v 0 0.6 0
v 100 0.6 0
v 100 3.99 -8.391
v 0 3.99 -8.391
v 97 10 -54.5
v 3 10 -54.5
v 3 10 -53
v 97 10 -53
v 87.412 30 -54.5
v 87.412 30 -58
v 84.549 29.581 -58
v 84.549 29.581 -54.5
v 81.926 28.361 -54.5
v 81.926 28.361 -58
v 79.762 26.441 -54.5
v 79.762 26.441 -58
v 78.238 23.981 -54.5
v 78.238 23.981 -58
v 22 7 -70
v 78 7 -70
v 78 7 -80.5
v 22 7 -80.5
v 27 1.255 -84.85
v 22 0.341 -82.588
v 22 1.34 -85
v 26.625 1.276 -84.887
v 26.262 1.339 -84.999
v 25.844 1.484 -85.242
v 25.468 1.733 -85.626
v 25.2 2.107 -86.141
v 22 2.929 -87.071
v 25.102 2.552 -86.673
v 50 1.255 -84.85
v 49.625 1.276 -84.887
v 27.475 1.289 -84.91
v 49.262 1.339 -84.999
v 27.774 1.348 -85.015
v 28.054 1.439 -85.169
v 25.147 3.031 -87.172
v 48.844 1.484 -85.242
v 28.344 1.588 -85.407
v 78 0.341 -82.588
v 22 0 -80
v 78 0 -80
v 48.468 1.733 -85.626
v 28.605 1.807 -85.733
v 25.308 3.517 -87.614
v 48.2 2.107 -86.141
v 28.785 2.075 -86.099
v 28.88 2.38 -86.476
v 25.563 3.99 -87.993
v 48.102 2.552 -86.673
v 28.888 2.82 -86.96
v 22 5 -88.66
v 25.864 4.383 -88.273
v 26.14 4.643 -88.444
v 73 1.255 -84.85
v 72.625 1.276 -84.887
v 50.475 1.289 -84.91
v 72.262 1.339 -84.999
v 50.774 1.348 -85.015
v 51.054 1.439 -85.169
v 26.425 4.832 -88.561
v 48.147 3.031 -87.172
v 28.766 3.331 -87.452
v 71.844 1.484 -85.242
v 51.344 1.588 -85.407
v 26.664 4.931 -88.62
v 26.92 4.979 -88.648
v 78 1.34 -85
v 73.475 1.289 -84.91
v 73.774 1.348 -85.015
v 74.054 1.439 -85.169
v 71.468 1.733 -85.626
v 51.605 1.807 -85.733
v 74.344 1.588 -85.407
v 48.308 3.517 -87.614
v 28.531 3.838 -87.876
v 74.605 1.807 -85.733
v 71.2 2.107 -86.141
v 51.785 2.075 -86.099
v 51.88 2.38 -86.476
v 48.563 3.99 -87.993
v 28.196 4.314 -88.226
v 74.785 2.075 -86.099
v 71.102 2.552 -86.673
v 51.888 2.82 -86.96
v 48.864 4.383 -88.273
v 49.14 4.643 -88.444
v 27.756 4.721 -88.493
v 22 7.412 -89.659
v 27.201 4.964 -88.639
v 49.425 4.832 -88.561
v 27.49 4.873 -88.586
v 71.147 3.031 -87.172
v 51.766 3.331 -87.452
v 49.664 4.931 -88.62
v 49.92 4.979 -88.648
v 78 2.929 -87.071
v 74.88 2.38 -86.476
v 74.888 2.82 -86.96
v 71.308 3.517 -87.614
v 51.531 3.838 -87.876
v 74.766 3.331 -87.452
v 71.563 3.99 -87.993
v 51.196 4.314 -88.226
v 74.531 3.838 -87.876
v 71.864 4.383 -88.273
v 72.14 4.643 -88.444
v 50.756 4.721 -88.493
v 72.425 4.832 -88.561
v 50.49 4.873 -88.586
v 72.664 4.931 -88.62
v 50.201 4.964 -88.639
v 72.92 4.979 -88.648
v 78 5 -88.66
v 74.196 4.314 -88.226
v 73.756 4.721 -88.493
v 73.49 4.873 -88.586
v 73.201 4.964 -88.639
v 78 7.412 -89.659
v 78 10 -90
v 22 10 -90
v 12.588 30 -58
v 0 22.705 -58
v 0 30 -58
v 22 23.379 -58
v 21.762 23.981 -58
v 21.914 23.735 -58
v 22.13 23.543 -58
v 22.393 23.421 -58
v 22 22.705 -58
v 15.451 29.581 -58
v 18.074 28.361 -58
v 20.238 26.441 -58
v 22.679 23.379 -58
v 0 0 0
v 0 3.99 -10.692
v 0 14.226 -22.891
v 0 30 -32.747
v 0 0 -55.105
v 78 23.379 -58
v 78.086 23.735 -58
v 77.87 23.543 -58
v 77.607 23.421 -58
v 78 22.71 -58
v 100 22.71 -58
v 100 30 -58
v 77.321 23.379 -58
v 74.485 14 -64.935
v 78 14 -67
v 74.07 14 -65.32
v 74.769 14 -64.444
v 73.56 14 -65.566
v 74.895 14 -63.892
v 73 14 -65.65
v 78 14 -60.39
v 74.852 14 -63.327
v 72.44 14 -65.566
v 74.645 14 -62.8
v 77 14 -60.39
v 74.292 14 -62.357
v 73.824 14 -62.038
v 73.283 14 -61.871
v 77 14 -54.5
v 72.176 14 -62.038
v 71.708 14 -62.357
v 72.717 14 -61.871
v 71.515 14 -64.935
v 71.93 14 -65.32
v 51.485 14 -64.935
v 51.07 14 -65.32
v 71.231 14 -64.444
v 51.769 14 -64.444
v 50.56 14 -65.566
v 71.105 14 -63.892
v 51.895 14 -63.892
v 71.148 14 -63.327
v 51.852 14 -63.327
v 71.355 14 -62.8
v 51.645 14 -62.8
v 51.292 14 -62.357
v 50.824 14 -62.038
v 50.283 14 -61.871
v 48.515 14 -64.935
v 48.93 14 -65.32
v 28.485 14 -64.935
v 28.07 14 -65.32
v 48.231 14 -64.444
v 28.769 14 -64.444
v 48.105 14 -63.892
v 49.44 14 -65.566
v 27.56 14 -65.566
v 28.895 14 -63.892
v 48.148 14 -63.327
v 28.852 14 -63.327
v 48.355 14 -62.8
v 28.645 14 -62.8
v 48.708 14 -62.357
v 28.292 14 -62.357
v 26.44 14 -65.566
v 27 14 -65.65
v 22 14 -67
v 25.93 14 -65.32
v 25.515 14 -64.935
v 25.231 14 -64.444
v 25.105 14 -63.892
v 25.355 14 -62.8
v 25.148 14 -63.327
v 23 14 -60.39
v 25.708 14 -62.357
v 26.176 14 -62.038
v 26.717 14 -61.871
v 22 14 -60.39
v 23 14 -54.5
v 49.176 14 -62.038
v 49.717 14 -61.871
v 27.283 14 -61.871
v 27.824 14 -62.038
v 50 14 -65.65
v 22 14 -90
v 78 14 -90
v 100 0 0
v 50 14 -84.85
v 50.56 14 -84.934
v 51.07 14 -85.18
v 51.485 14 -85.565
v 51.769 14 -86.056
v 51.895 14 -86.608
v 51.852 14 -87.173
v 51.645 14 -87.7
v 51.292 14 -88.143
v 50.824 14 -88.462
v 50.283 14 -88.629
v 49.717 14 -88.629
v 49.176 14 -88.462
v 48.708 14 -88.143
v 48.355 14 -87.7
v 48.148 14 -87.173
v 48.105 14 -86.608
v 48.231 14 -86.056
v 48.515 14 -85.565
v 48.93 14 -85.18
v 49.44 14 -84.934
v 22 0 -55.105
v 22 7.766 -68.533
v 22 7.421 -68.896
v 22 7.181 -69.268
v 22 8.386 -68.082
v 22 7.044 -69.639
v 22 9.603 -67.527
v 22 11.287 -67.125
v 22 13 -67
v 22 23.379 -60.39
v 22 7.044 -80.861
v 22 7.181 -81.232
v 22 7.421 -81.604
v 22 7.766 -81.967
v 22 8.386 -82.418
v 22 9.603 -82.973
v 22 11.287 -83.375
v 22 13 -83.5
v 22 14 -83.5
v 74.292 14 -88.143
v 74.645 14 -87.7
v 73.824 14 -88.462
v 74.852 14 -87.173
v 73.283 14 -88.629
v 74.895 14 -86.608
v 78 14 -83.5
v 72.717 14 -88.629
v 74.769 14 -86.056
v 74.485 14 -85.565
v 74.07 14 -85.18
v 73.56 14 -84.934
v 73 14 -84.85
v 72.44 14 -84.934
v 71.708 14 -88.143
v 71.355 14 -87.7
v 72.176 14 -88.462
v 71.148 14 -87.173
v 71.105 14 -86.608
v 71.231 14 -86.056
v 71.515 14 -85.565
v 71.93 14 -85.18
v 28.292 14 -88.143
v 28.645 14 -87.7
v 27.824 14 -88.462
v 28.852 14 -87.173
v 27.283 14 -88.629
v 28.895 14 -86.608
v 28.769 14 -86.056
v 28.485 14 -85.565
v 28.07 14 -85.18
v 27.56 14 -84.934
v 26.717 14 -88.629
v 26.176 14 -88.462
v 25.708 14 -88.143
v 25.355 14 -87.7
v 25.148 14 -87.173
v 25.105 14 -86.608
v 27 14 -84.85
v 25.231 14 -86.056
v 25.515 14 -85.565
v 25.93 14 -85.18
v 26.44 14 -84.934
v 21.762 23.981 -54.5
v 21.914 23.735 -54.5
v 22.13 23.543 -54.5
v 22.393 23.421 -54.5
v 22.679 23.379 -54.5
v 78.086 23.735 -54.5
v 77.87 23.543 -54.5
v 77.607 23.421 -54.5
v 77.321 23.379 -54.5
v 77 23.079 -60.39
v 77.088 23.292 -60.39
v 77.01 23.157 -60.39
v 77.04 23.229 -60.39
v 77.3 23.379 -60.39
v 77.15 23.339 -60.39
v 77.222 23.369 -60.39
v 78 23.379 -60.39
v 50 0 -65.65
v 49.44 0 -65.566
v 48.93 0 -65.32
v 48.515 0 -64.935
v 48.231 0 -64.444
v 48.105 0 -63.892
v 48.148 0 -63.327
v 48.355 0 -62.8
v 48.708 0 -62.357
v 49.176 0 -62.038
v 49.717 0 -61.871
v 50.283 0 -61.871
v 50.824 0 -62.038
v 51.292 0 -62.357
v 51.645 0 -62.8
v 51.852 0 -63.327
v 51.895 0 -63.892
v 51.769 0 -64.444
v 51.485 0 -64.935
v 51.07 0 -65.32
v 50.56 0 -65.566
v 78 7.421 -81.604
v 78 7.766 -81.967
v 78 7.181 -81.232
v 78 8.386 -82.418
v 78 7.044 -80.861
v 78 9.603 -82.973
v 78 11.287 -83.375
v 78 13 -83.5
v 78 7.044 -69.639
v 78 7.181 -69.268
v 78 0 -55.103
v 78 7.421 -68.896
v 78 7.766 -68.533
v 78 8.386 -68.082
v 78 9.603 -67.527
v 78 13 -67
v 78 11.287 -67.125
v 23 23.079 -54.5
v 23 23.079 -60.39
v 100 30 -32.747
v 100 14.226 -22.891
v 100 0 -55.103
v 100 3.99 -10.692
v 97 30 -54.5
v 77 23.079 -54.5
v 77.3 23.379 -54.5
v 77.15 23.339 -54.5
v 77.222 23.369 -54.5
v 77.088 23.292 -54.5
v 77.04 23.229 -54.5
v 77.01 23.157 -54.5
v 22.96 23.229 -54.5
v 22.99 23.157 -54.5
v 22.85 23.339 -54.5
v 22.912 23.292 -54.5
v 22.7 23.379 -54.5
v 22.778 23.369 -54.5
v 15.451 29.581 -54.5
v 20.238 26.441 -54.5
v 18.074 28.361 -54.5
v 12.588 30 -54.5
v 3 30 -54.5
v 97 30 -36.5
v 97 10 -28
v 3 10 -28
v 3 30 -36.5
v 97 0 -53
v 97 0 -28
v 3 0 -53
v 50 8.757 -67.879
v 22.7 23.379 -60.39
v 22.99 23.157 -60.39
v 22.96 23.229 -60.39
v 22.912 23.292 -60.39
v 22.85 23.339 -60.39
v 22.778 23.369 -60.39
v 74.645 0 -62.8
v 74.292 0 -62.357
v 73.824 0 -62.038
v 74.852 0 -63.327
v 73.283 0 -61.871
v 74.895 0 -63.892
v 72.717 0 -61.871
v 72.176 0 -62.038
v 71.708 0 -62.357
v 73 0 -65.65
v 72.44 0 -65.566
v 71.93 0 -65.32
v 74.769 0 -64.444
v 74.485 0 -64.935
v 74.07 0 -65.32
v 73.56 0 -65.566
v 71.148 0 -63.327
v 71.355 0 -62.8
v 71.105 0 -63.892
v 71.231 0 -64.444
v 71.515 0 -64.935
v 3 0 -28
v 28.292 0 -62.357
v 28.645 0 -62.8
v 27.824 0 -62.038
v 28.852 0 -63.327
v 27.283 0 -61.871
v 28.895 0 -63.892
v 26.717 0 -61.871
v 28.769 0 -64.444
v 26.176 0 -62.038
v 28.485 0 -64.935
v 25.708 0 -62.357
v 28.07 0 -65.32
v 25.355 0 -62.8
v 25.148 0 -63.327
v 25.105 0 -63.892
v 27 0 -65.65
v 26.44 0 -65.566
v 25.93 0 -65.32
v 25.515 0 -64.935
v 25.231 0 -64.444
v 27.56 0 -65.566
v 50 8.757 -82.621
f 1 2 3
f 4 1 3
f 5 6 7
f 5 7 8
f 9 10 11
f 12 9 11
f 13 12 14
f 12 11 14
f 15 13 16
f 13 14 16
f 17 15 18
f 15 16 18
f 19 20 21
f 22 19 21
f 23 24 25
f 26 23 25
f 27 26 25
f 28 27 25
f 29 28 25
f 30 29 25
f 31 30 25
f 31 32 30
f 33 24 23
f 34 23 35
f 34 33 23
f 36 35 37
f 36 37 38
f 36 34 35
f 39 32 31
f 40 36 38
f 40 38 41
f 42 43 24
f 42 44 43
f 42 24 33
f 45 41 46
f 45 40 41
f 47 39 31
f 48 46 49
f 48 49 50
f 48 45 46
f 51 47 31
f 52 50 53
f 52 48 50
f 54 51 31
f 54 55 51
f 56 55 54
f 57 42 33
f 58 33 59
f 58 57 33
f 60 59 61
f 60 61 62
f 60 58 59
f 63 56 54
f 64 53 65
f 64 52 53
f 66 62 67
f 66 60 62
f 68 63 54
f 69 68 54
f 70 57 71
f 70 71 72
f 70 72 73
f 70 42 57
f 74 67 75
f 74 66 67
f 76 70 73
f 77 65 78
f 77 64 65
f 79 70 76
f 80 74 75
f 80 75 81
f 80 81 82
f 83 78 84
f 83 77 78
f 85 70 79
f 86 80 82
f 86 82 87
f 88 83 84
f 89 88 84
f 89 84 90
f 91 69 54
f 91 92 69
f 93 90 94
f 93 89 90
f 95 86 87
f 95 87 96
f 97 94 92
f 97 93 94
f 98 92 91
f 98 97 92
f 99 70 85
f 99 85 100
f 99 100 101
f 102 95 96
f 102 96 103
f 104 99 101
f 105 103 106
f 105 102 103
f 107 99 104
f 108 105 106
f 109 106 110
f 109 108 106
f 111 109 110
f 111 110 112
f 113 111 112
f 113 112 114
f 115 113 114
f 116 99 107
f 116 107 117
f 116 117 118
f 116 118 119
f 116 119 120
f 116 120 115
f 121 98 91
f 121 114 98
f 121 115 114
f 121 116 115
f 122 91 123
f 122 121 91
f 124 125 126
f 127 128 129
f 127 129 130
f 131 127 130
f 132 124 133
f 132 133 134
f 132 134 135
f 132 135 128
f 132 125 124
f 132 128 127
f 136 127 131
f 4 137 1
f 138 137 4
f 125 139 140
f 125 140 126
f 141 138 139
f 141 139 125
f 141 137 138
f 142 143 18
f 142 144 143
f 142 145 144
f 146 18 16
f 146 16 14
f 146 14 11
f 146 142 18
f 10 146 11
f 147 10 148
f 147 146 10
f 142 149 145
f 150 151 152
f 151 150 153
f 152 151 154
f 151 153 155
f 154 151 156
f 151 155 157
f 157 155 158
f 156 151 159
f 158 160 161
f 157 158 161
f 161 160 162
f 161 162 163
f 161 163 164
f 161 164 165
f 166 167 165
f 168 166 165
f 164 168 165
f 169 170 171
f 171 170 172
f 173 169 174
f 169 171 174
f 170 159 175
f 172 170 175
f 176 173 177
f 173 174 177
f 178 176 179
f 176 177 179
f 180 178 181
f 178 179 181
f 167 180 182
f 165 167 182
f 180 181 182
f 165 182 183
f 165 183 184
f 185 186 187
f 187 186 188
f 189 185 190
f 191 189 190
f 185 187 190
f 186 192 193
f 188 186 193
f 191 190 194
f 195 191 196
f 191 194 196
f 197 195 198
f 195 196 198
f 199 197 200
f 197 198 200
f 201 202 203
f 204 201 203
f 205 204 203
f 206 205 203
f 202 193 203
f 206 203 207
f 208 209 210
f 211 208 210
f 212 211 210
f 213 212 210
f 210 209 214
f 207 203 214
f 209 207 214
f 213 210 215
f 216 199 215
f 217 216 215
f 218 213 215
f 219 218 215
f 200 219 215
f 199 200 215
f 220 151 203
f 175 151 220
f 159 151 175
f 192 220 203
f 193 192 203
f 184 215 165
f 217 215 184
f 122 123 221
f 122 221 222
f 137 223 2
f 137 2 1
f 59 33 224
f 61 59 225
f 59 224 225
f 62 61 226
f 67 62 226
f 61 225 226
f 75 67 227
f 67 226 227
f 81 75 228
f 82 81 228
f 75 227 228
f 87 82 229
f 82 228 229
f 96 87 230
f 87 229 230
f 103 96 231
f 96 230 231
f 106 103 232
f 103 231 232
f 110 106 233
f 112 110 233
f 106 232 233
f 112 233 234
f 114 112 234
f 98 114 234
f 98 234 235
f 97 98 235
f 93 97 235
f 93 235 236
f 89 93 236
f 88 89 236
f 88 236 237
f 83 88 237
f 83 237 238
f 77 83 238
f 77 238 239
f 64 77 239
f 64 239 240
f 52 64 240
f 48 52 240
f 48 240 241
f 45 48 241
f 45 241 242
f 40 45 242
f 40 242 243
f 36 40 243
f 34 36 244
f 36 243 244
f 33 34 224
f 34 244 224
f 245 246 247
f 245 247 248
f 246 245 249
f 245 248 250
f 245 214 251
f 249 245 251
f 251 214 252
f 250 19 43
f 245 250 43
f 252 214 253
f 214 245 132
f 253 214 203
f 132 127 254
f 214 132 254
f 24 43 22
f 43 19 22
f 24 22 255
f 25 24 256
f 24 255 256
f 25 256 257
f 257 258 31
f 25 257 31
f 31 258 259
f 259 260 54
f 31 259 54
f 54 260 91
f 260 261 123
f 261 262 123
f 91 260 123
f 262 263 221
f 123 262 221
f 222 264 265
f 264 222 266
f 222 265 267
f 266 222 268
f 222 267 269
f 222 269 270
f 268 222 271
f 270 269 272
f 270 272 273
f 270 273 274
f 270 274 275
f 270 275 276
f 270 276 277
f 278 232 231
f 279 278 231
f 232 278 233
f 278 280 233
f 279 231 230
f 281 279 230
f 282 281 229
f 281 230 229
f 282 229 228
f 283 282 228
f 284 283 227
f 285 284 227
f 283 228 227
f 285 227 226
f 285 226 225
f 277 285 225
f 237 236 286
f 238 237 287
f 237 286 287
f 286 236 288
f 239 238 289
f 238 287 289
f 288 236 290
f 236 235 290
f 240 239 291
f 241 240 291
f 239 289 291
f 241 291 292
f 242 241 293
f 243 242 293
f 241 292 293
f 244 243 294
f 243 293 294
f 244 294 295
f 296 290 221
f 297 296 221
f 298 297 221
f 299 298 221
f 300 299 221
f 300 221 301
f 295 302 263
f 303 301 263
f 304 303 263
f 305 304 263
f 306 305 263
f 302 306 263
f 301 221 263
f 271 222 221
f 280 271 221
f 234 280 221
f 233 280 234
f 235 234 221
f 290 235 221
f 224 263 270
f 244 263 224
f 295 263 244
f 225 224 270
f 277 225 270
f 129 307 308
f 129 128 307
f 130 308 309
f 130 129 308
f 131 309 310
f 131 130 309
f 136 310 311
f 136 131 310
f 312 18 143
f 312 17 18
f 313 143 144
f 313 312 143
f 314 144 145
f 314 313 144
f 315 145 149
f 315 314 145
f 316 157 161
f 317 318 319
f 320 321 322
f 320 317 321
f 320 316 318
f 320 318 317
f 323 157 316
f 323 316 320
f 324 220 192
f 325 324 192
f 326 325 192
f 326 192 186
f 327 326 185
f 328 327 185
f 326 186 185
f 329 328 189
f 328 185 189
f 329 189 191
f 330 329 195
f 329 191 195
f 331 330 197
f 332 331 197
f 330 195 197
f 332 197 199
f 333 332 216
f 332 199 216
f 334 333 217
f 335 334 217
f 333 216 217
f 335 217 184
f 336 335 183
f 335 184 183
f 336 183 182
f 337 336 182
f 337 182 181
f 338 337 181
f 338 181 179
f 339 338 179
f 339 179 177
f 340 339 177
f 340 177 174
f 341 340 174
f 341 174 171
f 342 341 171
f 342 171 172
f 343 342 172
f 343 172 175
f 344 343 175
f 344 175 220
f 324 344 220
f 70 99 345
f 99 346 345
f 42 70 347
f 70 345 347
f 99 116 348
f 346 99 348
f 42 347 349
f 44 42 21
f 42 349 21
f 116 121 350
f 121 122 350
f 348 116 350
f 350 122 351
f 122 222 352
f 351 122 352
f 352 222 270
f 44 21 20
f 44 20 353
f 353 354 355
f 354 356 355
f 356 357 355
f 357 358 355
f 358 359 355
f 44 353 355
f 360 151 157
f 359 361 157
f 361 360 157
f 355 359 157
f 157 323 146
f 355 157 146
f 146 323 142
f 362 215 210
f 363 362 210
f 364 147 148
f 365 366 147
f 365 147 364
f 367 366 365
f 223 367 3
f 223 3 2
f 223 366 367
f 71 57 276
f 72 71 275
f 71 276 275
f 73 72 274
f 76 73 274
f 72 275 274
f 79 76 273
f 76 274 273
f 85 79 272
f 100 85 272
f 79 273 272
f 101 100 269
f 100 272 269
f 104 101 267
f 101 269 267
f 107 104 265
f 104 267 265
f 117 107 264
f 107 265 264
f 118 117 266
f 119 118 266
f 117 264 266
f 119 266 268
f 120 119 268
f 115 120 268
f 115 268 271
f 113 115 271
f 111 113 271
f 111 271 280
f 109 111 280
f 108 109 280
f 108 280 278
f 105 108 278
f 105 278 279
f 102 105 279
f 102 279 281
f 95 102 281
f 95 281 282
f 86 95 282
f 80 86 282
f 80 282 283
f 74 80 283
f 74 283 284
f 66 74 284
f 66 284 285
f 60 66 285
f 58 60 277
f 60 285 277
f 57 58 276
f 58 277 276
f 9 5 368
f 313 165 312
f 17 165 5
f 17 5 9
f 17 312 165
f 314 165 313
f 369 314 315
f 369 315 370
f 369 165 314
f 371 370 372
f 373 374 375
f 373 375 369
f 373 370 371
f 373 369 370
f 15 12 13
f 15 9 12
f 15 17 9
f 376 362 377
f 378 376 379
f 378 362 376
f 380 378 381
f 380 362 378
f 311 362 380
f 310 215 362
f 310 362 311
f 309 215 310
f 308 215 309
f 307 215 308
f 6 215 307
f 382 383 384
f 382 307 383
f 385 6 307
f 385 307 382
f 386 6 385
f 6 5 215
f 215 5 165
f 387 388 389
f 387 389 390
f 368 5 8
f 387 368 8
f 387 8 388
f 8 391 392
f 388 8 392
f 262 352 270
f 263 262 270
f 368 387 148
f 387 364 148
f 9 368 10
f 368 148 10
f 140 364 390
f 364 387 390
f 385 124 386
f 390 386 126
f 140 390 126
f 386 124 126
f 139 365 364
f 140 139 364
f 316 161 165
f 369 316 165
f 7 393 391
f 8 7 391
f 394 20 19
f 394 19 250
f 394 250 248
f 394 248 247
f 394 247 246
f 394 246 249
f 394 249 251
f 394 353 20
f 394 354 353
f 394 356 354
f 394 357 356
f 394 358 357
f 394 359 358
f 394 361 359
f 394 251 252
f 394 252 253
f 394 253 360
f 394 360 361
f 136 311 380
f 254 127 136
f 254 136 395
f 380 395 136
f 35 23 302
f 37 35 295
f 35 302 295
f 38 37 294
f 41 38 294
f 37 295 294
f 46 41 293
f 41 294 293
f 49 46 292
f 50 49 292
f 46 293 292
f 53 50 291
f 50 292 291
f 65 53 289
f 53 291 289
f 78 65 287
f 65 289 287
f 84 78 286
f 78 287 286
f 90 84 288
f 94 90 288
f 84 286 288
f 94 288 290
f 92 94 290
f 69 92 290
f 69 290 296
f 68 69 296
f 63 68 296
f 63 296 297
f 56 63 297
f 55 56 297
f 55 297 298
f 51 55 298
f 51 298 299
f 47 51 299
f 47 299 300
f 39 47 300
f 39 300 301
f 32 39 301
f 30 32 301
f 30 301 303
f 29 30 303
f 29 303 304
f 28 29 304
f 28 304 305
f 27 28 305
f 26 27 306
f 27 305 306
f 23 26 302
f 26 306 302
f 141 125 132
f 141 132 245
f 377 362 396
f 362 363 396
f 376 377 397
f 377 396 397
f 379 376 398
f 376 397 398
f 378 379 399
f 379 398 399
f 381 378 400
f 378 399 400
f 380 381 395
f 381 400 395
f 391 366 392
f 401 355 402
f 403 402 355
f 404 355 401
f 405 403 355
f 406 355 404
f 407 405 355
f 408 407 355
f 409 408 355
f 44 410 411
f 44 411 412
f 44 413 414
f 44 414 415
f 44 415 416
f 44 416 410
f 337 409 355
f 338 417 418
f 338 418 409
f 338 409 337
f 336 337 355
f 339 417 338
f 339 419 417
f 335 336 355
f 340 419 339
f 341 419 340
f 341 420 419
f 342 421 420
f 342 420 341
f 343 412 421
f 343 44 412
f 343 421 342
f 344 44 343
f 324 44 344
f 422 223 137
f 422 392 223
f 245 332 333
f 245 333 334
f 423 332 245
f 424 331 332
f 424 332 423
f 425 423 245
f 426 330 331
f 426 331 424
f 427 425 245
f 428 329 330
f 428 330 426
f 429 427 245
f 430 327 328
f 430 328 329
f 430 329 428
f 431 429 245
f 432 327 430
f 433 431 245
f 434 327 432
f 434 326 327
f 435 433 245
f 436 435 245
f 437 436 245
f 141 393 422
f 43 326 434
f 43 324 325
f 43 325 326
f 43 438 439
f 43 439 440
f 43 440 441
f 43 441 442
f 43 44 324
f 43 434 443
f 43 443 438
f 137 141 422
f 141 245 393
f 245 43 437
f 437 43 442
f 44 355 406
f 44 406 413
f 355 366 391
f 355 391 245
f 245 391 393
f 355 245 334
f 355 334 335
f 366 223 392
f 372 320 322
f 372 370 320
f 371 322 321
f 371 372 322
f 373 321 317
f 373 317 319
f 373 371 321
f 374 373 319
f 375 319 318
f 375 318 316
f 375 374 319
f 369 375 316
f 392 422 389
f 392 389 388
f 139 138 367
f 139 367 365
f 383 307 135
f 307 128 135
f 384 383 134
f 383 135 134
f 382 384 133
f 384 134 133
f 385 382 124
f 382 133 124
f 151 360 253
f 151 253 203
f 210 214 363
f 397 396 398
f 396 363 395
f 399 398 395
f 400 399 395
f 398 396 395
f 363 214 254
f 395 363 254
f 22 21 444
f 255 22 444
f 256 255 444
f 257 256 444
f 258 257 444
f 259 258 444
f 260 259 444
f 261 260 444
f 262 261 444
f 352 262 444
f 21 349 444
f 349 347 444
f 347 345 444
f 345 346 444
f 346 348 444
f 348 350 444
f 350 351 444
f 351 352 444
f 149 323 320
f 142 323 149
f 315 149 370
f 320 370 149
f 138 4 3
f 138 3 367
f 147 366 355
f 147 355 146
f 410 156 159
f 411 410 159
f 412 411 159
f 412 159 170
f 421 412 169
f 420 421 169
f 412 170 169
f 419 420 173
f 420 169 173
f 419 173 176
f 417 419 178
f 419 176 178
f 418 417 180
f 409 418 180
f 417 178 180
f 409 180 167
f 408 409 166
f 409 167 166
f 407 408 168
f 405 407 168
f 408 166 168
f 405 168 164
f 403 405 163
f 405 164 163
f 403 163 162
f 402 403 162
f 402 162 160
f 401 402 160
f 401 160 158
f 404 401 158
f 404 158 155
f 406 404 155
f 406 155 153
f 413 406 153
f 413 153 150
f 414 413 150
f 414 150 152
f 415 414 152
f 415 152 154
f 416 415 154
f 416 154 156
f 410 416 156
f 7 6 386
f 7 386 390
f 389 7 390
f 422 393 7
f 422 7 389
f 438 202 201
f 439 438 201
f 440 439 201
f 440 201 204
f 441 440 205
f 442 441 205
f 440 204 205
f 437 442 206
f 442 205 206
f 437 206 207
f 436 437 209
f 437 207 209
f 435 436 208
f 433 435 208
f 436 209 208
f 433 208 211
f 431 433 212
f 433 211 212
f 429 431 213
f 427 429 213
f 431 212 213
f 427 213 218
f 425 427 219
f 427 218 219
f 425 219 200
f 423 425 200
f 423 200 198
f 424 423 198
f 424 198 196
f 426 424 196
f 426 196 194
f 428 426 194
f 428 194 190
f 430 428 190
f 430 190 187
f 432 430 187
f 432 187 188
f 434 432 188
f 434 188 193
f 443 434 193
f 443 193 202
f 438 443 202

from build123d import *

# Parameters (mm, degrees)
RESSALTO_EXTRUS_O1_DEPTH = 30
CORTE_EXTRUS_O1_DEPTH    = 100
ESBO_O4_W                = 94
ESBO_O4_H                = 25
CORTE_EXTRUS_O2_DEPTH    = 10
ESBO_O5_W                = 94
ESBO_O5_H                = 18
CORTE_EXTRUS_O3_DEPTH    = 20
CORTE_EXTRUS_O7_START    = -3
CORTE_EXTRUS_O7_DEPTH    = 94
ESBO_O8_W                = 32
ESBO_O8_H                = 15
CORTE_EXTRUS_O8_DEPTH    = 56
ESBO_O9_W                = 16.5
ESBO_O9_H                = 8
CORTE_EXTRUS_O9_DEPTH    = 56
FILETE1_SIZE             = 3
FILETE1_SIZE_2           = 6
FILETE2_SIZE             = 3
FILETE2_SIZE_2           = 6
FILETE3_R                = 10
ESBO_O12_W               = 32
ESBO_O12_H               = 1
CORTE_EXTRUS_O12_DEPTH   = 68
CORTE_EXTRUS_O13_REACH   = 121.432
ESBO_O14_W               = 56
ESBO_O14_H               = 16
CORTE_EXTRUS_O14_DEPTH   = 138.840487586
ESBO_O16_R               = 1.9
CORTE_EXTRUS_O15_DEPTH   = 136.484316502
ESBO_O19_W               = 5.89
ESBO_O19_H               = 9.379485794
RESSALTO_EXTRUS_O4_DEPTH = 1
ESBO_O20_W               = 5.89
ESBO_O20_H               = 9.379485794
RESSALTO_EXTRUS_O5_DEPTH = 1
FILETE5_R                = 10
FILETE6_R                = 0.3
FILETE7_R                = 1
CORTE_EXTRUS_O17_DEPTH   = 22
CORTE_EXTRUS_O18_DEPTH   = 22
CORTE_EXTRUS_O19_DEPTH   = 124


with BuildPart() as part:
    # Esboço2 → Ressalto-extrusão1 (new body)
    with BuildSketch(Plane(origin=(0, 0, 0), x_dir=(1, 0, 0), z_dir=(0, 1, 0))):
        Polygon((0, 0), (0, 58), (22, 58), (22, 90), (78, 90), (78, 58), (100, 58), (100, 0), align=None)
    extrude(amount=RESSALTO_EXTRUS_O1_DEPTH)

    # Esboço3 → Corte-extrusão1 (cut)
    with BuildSketch(Plane(origin=(100, 0, 0), x_dir=(0, 0, -1), z_dir=(1, 0, 0))):
        Polygon((0, 0.6), (9.828405069, 4.570933406), (22.126818959, 14.890527965), (31.568264957, 30), (0, 30), align=None)
    extrude(amount=-CORTE_EXTRUS_O1_DEPTH, mode=Mode.SUBTRACT)

    # Esboço4 → Corte-extrusão2 (cut)
    with BuildSketch(Plane.XZ):
        with Locations((50, -40.5)):
            Rectangle(ESBO_O4_W, ESBO_O4_H)
    extrude(amount=-CORTE_EXTRUS_O2_DEPTH, mode=Mode.SUBTRACT)

    # Esboço5 → Corte-extrusão3 (cut)
    with BuildSketch(Plane(origin=(0, 30, 0), x_dir=(1, 0, 0), z_dir=(0, 1, 0))):
        with Locations((50, 45.5)):
            Rectangle(ESBO_O5_W, ESBO_O5_H)
    extrude(amount=-CORTE_EXTRUS_O3_DEPTH, mode=Mode.SUBTRACT)

    # Esboço7 → Corte-extrusão7 (cut)
    with BuildSketch(Plane(origin=(100, 0, 0), x_dir=(0, 0, -1), z_dir=(1, 0, 0)).offset(CORTE_EXTRUS_O7_START)):
        Polygon((28, 10), (36.5, 30), (36.5, 10), align=None)
    extrude(amount=-CORTE_EXTRUS_O7_DEPTH, mode=Mode.SUBTRACT)

    # Esboço8 → Corte-extrusão8 (cut)
    with BuildSketch(Plane(origin=(78, 0, 0), x_dir=(0, 0, -1), z_dir=(1, 0, 0))):
        with Locations((74, 22.5)):
            Rectangle(ESBO_O8_W, ESBO_O8_H)
    extrude(amount=-CORTE_EXTRUS_O8_DEPTH, mode=Mode.SUBTRACT)

    # Esboço9 → Corte-extrusão9 (cut)
    with BuildSketch(Plane(origin=(78, 0, 0), x_dir=(0, 0, -1), z_dir=(1, 0, 0))):
        with Locations((75.25, 11)):
            Rectangle(ESBO_O9_W, ESBO_O9_H)
    extrude(amount=-CORTE_EXTRUS_O9_DEPTH, mode=Mode.SUBTRACT)

    # Filete1
    # an asymmetric fillet: 6, 3 mm, written as the material it adds along each edge
    with BuildSketch(Plane(origin=(78, 7, -67), x_dir=(0, 0, -1), z_dir=(-1, 0, 0))) as filete1_piece_1:
        with BuildLine():
            Bezier((FILETE1_SIZE, 0), (0, 0), (0, -FILETE1_SIZE_2), weights=[1, 0.707106781, 1])
            Line((0, -FILETE1_SIZE_2), (0, 0))
            Line((0, 0), (FILETE1_SIZE, 0))
        make_face()
    extrude(amount=56)

    # Filete2
    # an asymmetric fillet: 6, 3 mm, written as the material it adds along each edge
    with BuildSketch(Plane(origin=(78, 7, -83.5), x_dir=(0, 0, 1), z_dir=(-1, 0, 0))) as filete2_piece_1:
        with BuildLine():
            Bezier((FILETE2_SIZE, 0), (0, 0), (0, FILETE2_SIZE_2), weights=[1, 0.707106781, 1])
            Line((0, FILETE2_SIZE_2), (0, 0))
            Line((0, 0), (FILETE2_SIZE, 0))
        make_face()
    extrude(amount=56)

    # Filete3
    filete3_edges = [part.edges().sort_by_distance(p)[0] for p in [
        (50, 0, -90),
    ]]
    fillet(filete3_edges, radius=FILETE3_R)

    # Esboço12 → Corte-extrusão12 (cut)
    with BuildSketch(Plane.ZY.offset(-22)):
        with Locations((-74, 14.5)):
            Rectangle(ESBO_O12_W, ESBO_O12_H)
    extrude(amount=-CORTE_EXTRUS_O12_DEPTH, mode=Mode.SUBTRACT)

    # Esboço14 → Corte-extrusão13 (cut, up to next)
    with BuildSketch(Plane(origin=(0, 0, -58), x_dir=(-1, 0, 0), z_dir=(0, 0, -1)), mode=Mode.PRIVATE) as corte_extrus_o13_sk1:
        with Locations((-50, 22)):
            Rectangle(ESBO_O14_W, ESBO_O14_H)
    corte_extrus_o13_tool1 = extrude(corte_extrus_o13_sk1.sketch, amount=-CORTE_EXTRUS_O13_REACH, mode=Mode.PRIVATE) & part.part
    add(corte_extrus_o13_tool1.solids().sort_by_distance((50, 22, -58))[0], mode=Mode.SUBTRACT)

    # Esboço15 → Corte-extrusão14 (cut, through all)
    with BuildSketch(Plane(origin=(100, 0, 0), x_dir=(0, 0, -1), z_dir=(1, 0, 0))):
        Polygon((9.048997211, 4.256032191), (10.048997211, 4.256032191), (10.048997211, 4.756032191), align=None)
    extrude(amount=-CORTE_EXTRUS_O14_DEPTH, mode=Mode.SUBTRACT)

    # Esboço16 → Corte-extrusão15 (cut, through all)
    with BuildSketch(Plane(origin=(0, 14, 0), x_dir=(1, 0, 0), z_dir=(0, 1, 0))):
        with Locations(Location((73, 86.75, 0), (0, 0, 270))):
            Circle(ESBO_O16_R)
        with Locations(Location((27, 86.75, 0), (0, 0, 270))):
            Circle(ESBO_O16_R)
        with Locations(Location((73, 63.75, 0), (0, 0, 90))):
            Circle(ESBO_O16_R)
        with Locations(Location((27, 63.75, 0), (0, 0, 90))):
            Circle(ESBO_O16_R)
        with Locations(Location((50, 86.75, 0), (0, 0, 270))):
            Circle(ESBO_O16_R)
        with Locations(Location((50, 63.75, 0), (0, 0, 90))):
            Circle(ESBO_O16_R)
    extrude(amount=-CORTE_EXTRUS_O15_DEPTH, mode=Mode.SUBTRACT)

    # Esboço19 → Ressalto-extrusão4 (add)
    with BuildSketch(Plane.ZY.offset(-78)):
        with Locations((-57.445, 18.689742897)):
            Rectangle(ESBO_O19_W, ESBO_O19_H)
    extrude(amount=RESSALTO_EXTRUS_O4_DEPTH)

    # Esboço20 → Ressalto-extrusão5 (add)
    with BuildSketch(Plane(origin=(22, 0, 0), x_dir=(0, 0, -1), z_dir=(1, 0, 0))):
        with Locations((57.445, 18.689742897)):
            Rectangle(ESBO_O20_W, ESBO_O20_H)
    extrude(amount=RESSALTO_EXTRUS_O5_DEPTH)

    # Filete5
    # the kernel refuses this fillet: 10 mm, written as the material it takes off along each edge
    with BuildSketch(Plane(origin=(22, 30, -81.529114381), x_dir=(0, -1, 0), z_dir=(0, 0, 1))) as filete5_piece_1_section:
        with BuildLine():
            CenterArc((10, -9.411645752), FILETE5_R, 109.75193963, 70.24806037)
            Line((0, -9.411645752), (0, 0))
            Line((0, 0), (6.620514206, 0))
        make_face()
    filete5_piece_1 = extrude(amount=50.558228762, mode=Mode.PRIVATE)
    filete5_piece_1 = split(filete5_piece_1, bisect_by=Plane(origin=(18.353344597, 35.581105786, -38.871969959), z_dir=(0, -0.39114064034485163, -0.9203309184584747)), keep=Keep.TOP, mode=Mode.PRIVATE)
    add(filete5_piece_1, mode=Mode.SUBTRACT)
    with BuildSketch(Plane(origin=(78, 30, -81.529114381), x_dir=(0, -1, 0), z_dir=(0, 0, 1))) as filete5_piece_2_section:
        with BuildLine():
            CenterArc((10, 9.411645752), FILETE5_R, 180, 70.24806037)
            Line((0, 9.411645752), (0, 0))
            Line((0, 0), (6.620514206, 0))
        make_face()
    filete5_piece_2 = extrude(amount=50.558228762, mode=Mode.PRIVATE)
    filete5_piece_2 = split(filete5_piece_2, bisect_by=Plane(origin=(81.646655403, 35.581105786, -38.871969959), z_dir=(0, -0.39114064034485163, -0.9203309184584747)), keep=Keep.TOP, mode=Mode.PRIVATE)
    add(filete5_piece_2, mode=Mode.SUBTRACT)

    # Filete6
    filete6_edges = [part.edges().sort_by_distance(p)[0] for p in [
        (77, 23.379485794, -57.445),
        (23, 23.379485794, -57.445),
    ]]
    fillet(filete6_edges, radius=FILETE6_R)

    # Filete7
    filete7_edges = [part.edges().sort_by_distance(p)[0] for p in [
        (78, 23.379485794, -56.25),
        (22, 23.379485794, -56.25),
    ]]
    fillet(filete7_edges, radius=FILETE7_R)

    # Esboço22 → Corte-extrusão17 (cut)
    with BuildSketch(Plane.ZY):
        Polygon((-58, 0), (-58, 22.70530007), (-55.105367164, 0), align=None)
    extrude(amount=-CORTE_EXTRUS_O17_DEPTH, mode=Mode.SUBTRACT)

    # Esboço23 → Corte-extrusão18 (cut)
    with BuildSketch(Plane(origin=(100, 0, 0), x_dir=(0, 0, -1), z_dir=(1, 0, 0))):
        Polygon((58, 0), (55.102867158, 0), (58, 22.71), align=None)
    extrude(amount=-CORTE_EXTRUS_O18_DEPTH, mode=Mode.SUBTRACT)

    # Esboço27 → Corte-extrusão19 (cut)
    with BuildSketch(Plane.ZY):
        Polygon((-31.568264957, 30), (-22.126818959, 14.890527965), (-10.048997211, 4.756032191), (-7.995032748, 3.989987748), (-10.691784821, 3.989987748), (-22.89093609, 14.226291078), (-32.747443361, 30), align=None)
    extrude(amount=-CORTE_EXTRUS_O19_DEPTH, mode=Mode.SUBTRACT)


solid = part.part
